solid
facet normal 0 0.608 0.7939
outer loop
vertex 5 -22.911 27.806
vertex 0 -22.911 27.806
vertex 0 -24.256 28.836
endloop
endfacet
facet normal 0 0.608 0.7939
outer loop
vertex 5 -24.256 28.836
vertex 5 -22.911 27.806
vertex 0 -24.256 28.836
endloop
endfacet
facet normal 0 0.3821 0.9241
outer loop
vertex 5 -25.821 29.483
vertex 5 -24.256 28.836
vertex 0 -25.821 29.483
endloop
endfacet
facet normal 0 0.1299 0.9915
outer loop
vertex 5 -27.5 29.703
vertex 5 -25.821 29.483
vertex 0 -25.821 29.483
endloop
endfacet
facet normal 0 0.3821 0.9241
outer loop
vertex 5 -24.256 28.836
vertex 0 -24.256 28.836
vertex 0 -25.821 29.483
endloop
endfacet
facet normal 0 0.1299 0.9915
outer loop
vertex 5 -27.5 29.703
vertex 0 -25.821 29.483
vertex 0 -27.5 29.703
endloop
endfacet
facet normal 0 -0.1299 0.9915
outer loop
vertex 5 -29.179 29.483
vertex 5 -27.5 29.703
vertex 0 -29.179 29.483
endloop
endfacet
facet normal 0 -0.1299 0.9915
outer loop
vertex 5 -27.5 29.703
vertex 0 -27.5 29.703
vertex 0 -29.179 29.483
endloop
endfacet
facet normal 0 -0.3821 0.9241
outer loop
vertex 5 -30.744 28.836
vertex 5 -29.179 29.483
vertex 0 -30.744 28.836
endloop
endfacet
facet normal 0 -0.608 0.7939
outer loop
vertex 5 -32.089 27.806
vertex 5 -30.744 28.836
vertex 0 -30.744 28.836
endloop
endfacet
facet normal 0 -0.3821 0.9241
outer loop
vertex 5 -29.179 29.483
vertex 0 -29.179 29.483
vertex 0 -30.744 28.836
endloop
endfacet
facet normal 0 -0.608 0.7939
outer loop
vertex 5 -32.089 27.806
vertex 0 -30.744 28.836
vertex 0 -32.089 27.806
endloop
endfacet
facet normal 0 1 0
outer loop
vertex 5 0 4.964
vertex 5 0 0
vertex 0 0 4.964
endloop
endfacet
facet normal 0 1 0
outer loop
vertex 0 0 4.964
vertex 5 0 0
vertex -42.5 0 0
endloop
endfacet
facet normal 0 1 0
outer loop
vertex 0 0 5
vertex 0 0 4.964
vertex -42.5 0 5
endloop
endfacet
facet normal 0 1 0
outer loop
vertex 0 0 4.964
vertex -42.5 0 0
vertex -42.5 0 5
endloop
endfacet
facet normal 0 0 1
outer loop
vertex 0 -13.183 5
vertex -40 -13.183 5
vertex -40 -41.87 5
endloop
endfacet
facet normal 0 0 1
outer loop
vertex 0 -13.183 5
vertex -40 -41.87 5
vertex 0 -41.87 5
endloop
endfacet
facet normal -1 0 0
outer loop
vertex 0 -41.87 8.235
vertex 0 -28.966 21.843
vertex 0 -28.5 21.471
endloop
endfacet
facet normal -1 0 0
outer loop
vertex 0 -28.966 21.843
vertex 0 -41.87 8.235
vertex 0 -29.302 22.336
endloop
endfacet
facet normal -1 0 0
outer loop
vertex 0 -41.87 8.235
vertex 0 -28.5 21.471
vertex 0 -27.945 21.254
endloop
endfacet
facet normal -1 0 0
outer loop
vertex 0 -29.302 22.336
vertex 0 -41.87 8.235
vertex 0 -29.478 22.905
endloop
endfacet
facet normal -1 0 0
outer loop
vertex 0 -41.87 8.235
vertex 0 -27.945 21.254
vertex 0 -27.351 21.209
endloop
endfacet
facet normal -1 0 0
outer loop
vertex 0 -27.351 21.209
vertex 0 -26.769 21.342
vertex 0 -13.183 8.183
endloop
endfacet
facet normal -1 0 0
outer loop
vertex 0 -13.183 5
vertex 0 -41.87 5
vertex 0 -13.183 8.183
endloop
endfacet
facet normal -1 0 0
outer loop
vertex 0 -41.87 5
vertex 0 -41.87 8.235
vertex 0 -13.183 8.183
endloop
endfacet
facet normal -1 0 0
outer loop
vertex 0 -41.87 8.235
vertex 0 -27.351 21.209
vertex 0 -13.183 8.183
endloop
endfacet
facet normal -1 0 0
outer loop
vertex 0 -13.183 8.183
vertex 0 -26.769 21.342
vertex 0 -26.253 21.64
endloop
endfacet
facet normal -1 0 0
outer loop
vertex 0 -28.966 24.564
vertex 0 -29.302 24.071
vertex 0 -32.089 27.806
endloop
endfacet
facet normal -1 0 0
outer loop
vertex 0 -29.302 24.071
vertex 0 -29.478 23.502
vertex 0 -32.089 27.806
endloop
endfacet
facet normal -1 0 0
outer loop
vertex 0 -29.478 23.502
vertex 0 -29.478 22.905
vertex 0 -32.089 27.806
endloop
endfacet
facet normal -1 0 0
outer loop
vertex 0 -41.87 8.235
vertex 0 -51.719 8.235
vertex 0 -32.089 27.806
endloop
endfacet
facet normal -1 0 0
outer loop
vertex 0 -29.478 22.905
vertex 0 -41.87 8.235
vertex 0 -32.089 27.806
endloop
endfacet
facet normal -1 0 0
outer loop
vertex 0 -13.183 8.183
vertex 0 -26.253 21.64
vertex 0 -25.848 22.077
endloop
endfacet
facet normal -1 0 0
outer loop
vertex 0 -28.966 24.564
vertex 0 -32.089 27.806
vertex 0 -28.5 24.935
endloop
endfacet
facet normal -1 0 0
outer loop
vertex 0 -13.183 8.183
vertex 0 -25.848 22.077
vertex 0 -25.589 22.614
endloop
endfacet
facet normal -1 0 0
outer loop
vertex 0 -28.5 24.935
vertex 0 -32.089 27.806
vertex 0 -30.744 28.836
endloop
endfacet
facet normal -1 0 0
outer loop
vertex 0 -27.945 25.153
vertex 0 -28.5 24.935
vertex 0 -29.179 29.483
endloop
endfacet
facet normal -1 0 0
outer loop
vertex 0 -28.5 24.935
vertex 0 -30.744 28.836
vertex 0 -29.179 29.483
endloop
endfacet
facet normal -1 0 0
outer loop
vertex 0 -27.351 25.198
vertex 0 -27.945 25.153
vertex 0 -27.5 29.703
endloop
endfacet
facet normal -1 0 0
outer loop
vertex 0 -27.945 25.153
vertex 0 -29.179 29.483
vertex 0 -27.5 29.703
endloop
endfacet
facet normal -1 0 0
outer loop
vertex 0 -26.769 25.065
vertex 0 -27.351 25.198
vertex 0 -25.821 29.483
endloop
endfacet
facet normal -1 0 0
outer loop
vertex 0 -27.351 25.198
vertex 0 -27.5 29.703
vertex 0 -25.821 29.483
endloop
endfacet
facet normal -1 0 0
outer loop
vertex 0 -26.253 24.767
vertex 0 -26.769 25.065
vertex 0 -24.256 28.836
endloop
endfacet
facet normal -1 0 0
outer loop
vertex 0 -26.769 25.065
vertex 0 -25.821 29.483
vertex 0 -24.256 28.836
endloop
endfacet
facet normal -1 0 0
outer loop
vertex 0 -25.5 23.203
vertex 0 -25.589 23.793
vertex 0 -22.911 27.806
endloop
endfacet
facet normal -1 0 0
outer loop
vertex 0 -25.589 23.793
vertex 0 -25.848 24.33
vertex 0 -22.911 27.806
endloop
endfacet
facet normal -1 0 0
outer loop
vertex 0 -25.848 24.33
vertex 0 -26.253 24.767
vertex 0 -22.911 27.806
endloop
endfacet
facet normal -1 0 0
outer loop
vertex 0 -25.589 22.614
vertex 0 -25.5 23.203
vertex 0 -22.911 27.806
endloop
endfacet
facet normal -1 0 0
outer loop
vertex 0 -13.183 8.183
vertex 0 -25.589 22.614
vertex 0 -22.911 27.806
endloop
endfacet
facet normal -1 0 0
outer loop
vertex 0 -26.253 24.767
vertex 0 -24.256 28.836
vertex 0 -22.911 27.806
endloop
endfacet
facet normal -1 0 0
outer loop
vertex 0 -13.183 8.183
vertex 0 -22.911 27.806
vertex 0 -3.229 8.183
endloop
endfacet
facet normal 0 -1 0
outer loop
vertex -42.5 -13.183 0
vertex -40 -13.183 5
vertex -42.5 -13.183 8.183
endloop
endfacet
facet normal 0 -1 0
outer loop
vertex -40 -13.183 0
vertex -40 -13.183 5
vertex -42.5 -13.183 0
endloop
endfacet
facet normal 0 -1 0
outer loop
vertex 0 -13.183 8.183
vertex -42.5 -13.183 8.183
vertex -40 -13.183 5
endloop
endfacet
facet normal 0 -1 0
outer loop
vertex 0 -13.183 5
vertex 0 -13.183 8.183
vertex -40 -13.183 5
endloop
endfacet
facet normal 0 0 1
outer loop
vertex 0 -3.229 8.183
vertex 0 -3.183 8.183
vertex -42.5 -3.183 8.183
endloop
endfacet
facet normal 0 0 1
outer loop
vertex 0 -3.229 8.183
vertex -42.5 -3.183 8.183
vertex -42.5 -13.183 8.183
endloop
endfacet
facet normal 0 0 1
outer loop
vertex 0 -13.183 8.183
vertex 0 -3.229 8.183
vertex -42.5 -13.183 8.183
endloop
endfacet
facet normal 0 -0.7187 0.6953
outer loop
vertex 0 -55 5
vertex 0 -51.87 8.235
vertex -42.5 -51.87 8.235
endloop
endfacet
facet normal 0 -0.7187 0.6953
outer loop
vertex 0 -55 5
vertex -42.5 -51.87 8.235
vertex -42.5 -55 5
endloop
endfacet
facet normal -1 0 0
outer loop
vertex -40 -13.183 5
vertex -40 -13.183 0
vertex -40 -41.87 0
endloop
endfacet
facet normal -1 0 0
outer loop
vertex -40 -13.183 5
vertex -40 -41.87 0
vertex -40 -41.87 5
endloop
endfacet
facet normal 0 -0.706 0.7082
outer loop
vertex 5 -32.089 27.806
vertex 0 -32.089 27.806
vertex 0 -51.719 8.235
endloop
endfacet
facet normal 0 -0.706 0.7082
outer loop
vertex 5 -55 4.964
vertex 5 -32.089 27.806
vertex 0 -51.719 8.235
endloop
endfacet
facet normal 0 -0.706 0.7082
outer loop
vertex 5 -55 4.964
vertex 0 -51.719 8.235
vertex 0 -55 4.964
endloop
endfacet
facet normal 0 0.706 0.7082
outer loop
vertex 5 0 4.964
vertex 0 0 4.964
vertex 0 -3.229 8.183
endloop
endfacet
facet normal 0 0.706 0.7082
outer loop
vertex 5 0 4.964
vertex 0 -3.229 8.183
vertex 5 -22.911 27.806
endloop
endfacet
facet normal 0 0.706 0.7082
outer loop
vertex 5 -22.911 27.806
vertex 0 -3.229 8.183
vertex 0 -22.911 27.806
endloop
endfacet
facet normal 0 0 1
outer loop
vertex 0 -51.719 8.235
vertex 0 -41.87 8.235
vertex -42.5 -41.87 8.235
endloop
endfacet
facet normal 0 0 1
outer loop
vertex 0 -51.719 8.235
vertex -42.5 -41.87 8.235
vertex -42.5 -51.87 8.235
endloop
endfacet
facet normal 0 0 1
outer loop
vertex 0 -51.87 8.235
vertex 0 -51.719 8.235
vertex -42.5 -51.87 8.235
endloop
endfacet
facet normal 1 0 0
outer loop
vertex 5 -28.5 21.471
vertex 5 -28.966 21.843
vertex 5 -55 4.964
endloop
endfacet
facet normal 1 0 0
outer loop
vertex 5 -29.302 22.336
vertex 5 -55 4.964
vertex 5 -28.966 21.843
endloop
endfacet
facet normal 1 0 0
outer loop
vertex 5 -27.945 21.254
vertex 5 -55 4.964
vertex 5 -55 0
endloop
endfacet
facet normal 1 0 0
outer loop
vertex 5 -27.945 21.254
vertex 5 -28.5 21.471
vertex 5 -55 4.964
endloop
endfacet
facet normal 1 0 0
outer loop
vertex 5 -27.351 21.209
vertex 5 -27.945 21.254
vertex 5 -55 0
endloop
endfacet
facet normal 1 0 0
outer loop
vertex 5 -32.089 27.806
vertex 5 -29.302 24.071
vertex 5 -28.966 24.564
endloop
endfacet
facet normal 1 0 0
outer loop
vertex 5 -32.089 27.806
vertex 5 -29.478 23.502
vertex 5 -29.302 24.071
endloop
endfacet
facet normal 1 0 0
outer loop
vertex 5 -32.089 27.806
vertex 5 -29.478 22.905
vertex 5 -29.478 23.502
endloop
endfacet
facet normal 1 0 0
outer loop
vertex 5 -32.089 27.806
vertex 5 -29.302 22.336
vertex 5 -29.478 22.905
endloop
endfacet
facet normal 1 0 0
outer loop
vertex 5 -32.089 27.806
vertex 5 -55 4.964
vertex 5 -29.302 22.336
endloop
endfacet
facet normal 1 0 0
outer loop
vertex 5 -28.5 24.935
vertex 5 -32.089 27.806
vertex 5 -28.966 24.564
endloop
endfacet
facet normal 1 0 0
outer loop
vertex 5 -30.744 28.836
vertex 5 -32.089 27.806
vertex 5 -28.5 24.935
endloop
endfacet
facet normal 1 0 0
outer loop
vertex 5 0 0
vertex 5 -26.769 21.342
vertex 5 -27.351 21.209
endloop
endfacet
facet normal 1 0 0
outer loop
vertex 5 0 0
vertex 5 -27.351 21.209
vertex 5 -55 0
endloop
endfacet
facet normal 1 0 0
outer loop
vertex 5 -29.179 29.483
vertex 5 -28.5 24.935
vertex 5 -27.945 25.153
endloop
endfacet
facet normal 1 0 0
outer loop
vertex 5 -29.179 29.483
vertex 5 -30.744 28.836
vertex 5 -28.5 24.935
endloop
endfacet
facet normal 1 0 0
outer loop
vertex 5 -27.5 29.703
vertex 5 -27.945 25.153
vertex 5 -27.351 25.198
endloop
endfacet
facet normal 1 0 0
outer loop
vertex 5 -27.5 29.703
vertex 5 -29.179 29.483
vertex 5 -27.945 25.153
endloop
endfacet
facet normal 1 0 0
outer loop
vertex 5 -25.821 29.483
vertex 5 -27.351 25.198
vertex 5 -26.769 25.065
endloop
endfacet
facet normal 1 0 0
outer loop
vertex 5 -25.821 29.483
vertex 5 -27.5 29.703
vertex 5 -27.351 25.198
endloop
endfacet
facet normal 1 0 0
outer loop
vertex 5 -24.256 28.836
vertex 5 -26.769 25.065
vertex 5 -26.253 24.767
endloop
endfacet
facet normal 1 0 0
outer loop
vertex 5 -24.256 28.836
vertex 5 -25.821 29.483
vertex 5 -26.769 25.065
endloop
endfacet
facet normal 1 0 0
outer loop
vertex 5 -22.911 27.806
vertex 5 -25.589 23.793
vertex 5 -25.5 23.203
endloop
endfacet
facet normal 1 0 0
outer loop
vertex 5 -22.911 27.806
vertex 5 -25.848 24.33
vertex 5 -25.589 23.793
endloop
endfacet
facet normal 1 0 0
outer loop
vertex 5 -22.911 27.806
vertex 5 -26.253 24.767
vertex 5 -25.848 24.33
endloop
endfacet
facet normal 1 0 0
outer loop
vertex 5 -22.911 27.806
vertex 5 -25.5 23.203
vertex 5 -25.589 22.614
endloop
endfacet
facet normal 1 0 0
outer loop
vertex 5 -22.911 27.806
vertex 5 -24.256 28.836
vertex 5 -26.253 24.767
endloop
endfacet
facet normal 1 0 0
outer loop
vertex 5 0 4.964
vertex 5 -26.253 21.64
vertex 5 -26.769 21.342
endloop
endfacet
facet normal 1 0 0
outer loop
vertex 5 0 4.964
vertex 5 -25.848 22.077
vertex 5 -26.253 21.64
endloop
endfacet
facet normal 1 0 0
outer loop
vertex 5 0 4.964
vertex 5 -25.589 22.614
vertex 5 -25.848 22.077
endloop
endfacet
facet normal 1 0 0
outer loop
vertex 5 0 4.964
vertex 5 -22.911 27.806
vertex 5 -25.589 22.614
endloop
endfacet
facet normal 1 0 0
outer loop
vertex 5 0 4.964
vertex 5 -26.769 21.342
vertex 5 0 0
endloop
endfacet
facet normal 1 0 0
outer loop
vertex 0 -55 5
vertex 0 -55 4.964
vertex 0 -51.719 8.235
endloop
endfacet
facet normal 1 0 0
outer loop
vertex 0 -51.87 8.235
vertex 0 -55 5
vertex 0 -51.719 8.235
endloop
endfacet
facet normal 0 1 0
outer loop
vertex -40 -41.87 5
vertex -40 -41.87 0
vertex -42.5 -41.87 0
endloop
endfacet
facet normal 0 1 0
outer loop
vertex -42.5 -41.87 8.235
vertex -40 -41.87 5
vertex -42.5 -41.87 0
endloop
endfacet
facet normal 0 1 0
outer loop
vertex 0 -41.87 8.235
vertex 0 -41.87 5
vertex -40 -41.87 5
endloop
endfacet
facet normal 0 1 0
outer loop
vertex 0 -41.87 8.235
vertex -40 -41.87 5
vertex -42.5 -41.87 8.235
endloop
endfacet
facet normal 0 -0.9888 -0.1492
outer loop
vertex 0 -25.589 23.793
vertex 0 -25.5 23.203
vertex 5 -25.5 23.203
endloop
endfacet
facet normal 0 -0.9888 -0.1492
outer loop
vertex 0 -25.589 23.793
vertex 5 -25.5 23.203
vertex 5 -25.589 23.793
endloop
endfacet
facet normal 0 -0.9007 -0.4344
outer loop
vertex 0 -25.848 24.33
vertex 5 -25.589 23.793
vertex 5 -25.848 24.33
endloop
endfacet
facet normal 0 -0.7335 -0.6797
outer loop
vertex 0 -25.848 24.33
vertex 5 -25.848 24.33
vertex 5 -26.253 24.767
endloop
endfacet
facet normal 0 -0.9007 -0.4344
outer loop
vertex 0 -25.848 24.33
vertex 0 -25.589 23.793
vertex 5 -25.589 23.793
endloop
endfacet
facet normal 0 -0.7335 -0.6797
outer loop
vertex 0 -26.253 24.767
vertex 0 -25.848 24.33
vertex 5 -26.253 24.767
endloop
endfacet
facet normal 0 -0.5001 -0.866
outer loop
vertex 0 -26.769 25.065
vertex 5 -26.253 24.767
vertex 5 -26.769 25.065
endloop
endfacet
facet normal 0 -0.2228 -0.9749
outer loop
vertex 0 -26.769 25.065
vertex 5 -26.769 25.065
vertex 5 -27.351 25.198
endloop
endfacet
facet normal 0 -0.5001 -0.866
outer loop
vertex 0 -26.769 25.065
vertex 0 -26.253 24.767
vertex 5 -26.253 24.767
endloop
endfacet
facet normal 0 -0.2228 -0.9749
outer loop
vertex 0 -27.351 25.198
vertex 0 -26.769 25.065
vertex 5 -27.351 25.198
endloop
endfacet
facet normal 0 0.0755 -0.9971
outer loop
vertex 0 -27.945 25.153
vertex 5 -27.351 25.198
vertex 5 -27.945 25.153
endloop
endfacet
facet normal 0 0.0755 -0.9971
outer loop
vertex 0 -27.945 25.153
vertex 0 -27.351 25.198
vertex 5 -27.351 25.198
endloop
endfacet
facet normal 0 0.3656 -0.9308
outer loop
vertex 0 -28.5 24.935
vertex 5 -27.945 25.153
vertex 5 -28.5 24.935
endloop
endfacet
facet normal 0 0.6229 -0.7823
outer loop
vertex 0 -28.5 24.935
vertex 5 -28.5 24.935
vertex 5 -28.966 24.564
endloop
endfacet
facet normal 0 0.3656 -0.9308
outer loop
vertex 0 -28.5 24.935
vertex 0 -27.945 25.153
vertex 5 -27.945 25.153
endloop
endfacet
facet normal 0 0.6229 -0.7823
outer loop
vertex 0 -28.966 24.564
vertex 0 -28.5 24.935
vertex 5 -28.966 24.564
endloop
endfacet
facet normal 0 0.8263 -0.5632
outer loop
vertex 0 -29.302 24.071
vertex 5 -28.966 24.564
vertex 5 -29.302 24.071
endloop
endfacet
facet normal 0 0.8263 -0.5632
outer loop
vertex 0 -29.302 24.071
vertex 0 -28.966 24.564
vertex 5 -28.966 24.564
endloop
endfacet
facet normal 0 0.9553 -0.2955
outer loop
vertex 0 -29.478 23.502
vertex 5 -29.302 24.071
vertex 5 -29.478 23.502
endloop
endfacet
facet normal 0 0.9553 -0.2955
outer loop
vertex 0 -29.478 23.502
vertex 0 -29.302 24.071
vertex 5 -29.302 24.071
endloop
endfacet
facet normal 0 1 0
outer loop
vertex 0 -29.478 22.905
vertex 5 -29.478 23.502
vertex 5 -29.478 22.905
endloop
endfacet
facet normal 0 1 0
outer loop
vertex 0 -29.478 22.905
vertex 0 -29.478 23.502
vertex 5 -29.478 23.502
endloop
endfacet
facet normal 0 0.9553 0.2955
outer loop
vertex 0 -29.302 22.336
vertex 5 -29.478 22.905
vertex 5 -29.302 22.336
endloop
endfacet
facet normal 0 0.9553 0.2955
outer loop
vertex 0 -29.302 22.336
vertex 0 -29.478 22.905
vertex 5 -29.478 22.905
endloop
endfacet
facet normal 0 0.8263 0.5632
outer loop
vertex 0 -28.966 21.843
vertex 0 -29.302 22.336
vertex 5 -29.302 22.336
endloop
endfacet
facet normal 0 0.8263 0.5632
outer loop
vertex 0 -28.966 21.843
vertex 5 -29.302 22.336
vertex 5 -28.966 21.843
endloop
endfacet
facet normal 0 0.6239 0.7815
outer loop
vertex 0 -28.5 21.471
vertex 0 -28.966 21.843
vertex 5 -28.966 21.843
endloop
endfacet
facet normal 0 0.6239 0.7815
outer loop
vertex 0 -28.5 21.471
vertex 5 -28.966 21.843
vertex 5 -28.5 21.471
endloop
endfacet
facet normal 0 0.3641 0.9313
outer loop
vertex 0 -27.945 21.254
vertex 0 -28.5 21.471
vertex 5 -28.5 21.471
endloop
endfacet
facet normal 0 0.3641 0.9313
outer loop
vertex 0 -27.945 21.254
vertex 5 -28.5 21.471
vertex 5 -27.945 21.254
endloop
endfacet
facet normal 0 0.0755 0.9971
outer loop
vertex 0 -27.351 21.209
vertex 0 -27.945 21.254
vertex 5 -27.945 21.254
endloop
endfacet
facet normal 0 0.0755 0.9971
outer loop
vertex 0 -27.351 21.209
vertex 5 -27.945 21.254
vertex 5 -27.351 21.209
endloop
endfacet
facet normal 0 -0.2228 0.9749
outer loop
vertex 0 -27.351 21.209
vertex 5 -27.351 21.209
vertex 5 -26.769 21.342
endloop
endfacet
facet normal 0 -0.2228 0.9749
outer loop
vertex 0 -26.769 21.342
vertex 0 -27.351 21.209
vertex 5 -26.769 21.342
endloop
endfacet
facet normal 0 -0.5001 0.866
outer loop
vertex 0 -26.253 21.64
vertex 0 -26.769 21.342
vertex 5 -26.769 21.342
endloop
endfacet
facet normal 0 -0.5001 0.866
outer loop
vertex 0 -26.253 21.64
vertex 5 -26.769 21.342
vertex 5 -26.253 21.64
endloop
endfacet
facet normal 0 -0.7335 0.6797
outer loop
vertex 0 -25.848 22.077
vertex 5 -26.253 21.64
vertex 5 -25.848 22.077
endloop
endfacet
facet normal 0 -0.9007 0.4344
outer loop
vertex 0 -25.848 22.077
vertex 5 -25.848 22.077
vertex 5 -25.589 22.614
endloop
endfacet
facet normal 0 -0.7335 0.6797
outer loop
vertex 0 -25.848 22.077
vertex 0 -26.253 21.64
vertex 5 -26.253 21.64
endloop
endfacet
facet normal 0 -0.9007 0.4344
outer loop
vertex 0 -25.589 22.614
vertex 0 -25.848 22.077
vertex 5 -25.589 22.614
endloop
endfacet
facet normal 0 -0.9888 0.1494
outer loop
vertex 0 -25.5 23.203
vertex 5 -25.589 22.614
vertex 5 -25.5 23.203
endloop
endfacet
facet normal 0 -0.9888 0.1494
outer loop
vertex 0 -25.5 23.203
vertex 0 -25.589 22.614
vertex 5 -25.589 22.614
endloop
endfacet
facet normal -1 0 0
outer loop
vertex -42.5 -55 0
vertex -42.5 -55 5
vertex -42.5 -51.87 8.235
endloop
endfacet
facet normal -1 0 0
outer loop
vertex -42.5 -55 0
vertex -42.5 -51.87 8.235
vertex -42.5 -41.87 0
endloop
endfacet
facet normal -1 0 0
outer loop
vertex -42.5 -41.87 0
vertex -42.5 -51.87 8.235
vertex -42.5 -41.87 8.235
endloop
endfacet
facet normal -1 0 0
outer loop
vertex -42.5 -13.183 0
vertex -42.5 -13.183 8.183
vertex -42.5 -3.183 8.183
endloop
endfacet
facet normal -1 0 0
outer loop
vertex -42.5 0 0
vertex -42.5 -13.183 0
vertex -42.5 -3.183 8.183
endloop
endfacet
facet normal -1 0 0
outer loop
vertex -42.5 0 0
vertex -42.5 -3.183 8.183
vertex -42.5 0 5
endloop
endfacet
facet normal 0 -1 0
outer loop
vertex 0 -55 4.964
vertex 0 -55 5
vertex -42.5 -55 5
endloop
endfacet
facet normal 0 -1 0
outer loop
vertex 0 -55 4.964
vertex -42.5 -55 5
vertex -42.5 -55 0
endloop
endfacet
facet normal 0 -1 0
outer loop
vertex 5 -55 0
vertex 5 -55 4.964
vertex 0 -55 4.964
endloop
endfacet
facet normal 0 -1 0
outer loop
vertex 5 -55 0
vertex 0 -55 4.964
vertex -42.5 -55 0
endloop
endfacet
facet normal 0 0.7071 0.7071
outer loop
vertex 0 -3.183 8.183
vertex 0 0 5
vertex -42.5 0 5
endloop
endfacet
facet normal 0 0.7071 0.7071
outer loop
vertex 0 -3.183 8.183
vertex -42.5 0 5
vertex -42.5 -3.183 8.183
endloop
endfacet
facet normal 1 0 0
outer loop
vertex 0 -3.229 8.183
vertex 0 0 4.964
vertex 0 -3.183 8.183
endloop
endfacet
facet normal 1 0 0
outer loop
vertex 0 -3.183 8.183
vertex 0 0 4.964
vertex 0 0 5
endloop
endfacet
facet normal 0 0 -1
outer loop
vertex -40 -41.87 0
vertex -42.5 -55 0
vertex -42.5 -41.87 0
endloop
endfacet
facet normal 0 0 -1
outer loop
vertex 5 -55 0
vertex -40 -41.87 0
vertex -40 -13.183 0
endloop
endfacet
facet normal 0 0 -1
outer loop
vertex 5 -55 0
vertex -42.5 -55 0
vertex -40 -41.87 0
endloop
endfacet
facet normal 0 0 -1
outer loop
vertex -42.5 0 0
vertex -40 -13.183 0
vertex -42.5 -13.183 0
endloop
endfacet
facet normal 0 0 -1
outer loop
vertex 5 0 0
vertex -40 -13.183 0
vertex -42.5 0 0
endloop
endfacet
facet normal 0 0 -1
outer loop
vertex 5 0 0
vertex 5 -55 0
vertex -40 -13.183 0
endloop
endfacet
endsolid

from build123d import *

# Parameters (mm, degrees)
F0_W     = 40
F0_H     = 5
F1_DEPTH = 55
F2_R     = 2
F3_DEPTH = 5
F5_DEPTH = 42.5


with BuildPart() as f1:
    # F0 (on Front) → F1 (new body)
    with BuildSketch(Plane.XZ):
        with Locations((-20, 2.5)):
            Rectangle(F0_W, F0_H)
    extrude(amount=F1_DEPTH)

    # F2 (on Right) → F3 (join)
    with BuildSketch(Plane.YZ):
        Polygon((-5.740549, 0), (0, 0), (0, 4.96355), (-55, 4.96355), (-55, 0), align=None)
        with BuildLine():
            Line((-55, 4.96355), (0, 4.96355))
            Line((0, 4.96355), (-22.910616, 27.806423))
            ThreePointArc((-22.910616, 27.806423), (-27.5, 29.703428), (-32.089384, 27.806423))
            Line((-32.089384, 27.806423), (-55, 4.96355))
        make_face()
        with Locations((-27.5, 23.203428)):
            Circle(F2_R, mode=Mode.SUBTRACT)
    extrude(amount=F3_DEPTH)

    # F4 (on Right) → F5 (join)
    with BuildSketch(Plane.YZ):
        Polygon((-55, 5), (-55, 0), (-41.870234, 0), (-41.870234, 8.235325), (-51.870234, 8.235325), align=None)
        Polygon((0, 0), (0, 5), (-3.183106, 8.18286), (-13.183106, 8.18286), (-13.183106, 0), align=None)
    extrude(amount=-F5_DEPTH)


solid = f1.part
